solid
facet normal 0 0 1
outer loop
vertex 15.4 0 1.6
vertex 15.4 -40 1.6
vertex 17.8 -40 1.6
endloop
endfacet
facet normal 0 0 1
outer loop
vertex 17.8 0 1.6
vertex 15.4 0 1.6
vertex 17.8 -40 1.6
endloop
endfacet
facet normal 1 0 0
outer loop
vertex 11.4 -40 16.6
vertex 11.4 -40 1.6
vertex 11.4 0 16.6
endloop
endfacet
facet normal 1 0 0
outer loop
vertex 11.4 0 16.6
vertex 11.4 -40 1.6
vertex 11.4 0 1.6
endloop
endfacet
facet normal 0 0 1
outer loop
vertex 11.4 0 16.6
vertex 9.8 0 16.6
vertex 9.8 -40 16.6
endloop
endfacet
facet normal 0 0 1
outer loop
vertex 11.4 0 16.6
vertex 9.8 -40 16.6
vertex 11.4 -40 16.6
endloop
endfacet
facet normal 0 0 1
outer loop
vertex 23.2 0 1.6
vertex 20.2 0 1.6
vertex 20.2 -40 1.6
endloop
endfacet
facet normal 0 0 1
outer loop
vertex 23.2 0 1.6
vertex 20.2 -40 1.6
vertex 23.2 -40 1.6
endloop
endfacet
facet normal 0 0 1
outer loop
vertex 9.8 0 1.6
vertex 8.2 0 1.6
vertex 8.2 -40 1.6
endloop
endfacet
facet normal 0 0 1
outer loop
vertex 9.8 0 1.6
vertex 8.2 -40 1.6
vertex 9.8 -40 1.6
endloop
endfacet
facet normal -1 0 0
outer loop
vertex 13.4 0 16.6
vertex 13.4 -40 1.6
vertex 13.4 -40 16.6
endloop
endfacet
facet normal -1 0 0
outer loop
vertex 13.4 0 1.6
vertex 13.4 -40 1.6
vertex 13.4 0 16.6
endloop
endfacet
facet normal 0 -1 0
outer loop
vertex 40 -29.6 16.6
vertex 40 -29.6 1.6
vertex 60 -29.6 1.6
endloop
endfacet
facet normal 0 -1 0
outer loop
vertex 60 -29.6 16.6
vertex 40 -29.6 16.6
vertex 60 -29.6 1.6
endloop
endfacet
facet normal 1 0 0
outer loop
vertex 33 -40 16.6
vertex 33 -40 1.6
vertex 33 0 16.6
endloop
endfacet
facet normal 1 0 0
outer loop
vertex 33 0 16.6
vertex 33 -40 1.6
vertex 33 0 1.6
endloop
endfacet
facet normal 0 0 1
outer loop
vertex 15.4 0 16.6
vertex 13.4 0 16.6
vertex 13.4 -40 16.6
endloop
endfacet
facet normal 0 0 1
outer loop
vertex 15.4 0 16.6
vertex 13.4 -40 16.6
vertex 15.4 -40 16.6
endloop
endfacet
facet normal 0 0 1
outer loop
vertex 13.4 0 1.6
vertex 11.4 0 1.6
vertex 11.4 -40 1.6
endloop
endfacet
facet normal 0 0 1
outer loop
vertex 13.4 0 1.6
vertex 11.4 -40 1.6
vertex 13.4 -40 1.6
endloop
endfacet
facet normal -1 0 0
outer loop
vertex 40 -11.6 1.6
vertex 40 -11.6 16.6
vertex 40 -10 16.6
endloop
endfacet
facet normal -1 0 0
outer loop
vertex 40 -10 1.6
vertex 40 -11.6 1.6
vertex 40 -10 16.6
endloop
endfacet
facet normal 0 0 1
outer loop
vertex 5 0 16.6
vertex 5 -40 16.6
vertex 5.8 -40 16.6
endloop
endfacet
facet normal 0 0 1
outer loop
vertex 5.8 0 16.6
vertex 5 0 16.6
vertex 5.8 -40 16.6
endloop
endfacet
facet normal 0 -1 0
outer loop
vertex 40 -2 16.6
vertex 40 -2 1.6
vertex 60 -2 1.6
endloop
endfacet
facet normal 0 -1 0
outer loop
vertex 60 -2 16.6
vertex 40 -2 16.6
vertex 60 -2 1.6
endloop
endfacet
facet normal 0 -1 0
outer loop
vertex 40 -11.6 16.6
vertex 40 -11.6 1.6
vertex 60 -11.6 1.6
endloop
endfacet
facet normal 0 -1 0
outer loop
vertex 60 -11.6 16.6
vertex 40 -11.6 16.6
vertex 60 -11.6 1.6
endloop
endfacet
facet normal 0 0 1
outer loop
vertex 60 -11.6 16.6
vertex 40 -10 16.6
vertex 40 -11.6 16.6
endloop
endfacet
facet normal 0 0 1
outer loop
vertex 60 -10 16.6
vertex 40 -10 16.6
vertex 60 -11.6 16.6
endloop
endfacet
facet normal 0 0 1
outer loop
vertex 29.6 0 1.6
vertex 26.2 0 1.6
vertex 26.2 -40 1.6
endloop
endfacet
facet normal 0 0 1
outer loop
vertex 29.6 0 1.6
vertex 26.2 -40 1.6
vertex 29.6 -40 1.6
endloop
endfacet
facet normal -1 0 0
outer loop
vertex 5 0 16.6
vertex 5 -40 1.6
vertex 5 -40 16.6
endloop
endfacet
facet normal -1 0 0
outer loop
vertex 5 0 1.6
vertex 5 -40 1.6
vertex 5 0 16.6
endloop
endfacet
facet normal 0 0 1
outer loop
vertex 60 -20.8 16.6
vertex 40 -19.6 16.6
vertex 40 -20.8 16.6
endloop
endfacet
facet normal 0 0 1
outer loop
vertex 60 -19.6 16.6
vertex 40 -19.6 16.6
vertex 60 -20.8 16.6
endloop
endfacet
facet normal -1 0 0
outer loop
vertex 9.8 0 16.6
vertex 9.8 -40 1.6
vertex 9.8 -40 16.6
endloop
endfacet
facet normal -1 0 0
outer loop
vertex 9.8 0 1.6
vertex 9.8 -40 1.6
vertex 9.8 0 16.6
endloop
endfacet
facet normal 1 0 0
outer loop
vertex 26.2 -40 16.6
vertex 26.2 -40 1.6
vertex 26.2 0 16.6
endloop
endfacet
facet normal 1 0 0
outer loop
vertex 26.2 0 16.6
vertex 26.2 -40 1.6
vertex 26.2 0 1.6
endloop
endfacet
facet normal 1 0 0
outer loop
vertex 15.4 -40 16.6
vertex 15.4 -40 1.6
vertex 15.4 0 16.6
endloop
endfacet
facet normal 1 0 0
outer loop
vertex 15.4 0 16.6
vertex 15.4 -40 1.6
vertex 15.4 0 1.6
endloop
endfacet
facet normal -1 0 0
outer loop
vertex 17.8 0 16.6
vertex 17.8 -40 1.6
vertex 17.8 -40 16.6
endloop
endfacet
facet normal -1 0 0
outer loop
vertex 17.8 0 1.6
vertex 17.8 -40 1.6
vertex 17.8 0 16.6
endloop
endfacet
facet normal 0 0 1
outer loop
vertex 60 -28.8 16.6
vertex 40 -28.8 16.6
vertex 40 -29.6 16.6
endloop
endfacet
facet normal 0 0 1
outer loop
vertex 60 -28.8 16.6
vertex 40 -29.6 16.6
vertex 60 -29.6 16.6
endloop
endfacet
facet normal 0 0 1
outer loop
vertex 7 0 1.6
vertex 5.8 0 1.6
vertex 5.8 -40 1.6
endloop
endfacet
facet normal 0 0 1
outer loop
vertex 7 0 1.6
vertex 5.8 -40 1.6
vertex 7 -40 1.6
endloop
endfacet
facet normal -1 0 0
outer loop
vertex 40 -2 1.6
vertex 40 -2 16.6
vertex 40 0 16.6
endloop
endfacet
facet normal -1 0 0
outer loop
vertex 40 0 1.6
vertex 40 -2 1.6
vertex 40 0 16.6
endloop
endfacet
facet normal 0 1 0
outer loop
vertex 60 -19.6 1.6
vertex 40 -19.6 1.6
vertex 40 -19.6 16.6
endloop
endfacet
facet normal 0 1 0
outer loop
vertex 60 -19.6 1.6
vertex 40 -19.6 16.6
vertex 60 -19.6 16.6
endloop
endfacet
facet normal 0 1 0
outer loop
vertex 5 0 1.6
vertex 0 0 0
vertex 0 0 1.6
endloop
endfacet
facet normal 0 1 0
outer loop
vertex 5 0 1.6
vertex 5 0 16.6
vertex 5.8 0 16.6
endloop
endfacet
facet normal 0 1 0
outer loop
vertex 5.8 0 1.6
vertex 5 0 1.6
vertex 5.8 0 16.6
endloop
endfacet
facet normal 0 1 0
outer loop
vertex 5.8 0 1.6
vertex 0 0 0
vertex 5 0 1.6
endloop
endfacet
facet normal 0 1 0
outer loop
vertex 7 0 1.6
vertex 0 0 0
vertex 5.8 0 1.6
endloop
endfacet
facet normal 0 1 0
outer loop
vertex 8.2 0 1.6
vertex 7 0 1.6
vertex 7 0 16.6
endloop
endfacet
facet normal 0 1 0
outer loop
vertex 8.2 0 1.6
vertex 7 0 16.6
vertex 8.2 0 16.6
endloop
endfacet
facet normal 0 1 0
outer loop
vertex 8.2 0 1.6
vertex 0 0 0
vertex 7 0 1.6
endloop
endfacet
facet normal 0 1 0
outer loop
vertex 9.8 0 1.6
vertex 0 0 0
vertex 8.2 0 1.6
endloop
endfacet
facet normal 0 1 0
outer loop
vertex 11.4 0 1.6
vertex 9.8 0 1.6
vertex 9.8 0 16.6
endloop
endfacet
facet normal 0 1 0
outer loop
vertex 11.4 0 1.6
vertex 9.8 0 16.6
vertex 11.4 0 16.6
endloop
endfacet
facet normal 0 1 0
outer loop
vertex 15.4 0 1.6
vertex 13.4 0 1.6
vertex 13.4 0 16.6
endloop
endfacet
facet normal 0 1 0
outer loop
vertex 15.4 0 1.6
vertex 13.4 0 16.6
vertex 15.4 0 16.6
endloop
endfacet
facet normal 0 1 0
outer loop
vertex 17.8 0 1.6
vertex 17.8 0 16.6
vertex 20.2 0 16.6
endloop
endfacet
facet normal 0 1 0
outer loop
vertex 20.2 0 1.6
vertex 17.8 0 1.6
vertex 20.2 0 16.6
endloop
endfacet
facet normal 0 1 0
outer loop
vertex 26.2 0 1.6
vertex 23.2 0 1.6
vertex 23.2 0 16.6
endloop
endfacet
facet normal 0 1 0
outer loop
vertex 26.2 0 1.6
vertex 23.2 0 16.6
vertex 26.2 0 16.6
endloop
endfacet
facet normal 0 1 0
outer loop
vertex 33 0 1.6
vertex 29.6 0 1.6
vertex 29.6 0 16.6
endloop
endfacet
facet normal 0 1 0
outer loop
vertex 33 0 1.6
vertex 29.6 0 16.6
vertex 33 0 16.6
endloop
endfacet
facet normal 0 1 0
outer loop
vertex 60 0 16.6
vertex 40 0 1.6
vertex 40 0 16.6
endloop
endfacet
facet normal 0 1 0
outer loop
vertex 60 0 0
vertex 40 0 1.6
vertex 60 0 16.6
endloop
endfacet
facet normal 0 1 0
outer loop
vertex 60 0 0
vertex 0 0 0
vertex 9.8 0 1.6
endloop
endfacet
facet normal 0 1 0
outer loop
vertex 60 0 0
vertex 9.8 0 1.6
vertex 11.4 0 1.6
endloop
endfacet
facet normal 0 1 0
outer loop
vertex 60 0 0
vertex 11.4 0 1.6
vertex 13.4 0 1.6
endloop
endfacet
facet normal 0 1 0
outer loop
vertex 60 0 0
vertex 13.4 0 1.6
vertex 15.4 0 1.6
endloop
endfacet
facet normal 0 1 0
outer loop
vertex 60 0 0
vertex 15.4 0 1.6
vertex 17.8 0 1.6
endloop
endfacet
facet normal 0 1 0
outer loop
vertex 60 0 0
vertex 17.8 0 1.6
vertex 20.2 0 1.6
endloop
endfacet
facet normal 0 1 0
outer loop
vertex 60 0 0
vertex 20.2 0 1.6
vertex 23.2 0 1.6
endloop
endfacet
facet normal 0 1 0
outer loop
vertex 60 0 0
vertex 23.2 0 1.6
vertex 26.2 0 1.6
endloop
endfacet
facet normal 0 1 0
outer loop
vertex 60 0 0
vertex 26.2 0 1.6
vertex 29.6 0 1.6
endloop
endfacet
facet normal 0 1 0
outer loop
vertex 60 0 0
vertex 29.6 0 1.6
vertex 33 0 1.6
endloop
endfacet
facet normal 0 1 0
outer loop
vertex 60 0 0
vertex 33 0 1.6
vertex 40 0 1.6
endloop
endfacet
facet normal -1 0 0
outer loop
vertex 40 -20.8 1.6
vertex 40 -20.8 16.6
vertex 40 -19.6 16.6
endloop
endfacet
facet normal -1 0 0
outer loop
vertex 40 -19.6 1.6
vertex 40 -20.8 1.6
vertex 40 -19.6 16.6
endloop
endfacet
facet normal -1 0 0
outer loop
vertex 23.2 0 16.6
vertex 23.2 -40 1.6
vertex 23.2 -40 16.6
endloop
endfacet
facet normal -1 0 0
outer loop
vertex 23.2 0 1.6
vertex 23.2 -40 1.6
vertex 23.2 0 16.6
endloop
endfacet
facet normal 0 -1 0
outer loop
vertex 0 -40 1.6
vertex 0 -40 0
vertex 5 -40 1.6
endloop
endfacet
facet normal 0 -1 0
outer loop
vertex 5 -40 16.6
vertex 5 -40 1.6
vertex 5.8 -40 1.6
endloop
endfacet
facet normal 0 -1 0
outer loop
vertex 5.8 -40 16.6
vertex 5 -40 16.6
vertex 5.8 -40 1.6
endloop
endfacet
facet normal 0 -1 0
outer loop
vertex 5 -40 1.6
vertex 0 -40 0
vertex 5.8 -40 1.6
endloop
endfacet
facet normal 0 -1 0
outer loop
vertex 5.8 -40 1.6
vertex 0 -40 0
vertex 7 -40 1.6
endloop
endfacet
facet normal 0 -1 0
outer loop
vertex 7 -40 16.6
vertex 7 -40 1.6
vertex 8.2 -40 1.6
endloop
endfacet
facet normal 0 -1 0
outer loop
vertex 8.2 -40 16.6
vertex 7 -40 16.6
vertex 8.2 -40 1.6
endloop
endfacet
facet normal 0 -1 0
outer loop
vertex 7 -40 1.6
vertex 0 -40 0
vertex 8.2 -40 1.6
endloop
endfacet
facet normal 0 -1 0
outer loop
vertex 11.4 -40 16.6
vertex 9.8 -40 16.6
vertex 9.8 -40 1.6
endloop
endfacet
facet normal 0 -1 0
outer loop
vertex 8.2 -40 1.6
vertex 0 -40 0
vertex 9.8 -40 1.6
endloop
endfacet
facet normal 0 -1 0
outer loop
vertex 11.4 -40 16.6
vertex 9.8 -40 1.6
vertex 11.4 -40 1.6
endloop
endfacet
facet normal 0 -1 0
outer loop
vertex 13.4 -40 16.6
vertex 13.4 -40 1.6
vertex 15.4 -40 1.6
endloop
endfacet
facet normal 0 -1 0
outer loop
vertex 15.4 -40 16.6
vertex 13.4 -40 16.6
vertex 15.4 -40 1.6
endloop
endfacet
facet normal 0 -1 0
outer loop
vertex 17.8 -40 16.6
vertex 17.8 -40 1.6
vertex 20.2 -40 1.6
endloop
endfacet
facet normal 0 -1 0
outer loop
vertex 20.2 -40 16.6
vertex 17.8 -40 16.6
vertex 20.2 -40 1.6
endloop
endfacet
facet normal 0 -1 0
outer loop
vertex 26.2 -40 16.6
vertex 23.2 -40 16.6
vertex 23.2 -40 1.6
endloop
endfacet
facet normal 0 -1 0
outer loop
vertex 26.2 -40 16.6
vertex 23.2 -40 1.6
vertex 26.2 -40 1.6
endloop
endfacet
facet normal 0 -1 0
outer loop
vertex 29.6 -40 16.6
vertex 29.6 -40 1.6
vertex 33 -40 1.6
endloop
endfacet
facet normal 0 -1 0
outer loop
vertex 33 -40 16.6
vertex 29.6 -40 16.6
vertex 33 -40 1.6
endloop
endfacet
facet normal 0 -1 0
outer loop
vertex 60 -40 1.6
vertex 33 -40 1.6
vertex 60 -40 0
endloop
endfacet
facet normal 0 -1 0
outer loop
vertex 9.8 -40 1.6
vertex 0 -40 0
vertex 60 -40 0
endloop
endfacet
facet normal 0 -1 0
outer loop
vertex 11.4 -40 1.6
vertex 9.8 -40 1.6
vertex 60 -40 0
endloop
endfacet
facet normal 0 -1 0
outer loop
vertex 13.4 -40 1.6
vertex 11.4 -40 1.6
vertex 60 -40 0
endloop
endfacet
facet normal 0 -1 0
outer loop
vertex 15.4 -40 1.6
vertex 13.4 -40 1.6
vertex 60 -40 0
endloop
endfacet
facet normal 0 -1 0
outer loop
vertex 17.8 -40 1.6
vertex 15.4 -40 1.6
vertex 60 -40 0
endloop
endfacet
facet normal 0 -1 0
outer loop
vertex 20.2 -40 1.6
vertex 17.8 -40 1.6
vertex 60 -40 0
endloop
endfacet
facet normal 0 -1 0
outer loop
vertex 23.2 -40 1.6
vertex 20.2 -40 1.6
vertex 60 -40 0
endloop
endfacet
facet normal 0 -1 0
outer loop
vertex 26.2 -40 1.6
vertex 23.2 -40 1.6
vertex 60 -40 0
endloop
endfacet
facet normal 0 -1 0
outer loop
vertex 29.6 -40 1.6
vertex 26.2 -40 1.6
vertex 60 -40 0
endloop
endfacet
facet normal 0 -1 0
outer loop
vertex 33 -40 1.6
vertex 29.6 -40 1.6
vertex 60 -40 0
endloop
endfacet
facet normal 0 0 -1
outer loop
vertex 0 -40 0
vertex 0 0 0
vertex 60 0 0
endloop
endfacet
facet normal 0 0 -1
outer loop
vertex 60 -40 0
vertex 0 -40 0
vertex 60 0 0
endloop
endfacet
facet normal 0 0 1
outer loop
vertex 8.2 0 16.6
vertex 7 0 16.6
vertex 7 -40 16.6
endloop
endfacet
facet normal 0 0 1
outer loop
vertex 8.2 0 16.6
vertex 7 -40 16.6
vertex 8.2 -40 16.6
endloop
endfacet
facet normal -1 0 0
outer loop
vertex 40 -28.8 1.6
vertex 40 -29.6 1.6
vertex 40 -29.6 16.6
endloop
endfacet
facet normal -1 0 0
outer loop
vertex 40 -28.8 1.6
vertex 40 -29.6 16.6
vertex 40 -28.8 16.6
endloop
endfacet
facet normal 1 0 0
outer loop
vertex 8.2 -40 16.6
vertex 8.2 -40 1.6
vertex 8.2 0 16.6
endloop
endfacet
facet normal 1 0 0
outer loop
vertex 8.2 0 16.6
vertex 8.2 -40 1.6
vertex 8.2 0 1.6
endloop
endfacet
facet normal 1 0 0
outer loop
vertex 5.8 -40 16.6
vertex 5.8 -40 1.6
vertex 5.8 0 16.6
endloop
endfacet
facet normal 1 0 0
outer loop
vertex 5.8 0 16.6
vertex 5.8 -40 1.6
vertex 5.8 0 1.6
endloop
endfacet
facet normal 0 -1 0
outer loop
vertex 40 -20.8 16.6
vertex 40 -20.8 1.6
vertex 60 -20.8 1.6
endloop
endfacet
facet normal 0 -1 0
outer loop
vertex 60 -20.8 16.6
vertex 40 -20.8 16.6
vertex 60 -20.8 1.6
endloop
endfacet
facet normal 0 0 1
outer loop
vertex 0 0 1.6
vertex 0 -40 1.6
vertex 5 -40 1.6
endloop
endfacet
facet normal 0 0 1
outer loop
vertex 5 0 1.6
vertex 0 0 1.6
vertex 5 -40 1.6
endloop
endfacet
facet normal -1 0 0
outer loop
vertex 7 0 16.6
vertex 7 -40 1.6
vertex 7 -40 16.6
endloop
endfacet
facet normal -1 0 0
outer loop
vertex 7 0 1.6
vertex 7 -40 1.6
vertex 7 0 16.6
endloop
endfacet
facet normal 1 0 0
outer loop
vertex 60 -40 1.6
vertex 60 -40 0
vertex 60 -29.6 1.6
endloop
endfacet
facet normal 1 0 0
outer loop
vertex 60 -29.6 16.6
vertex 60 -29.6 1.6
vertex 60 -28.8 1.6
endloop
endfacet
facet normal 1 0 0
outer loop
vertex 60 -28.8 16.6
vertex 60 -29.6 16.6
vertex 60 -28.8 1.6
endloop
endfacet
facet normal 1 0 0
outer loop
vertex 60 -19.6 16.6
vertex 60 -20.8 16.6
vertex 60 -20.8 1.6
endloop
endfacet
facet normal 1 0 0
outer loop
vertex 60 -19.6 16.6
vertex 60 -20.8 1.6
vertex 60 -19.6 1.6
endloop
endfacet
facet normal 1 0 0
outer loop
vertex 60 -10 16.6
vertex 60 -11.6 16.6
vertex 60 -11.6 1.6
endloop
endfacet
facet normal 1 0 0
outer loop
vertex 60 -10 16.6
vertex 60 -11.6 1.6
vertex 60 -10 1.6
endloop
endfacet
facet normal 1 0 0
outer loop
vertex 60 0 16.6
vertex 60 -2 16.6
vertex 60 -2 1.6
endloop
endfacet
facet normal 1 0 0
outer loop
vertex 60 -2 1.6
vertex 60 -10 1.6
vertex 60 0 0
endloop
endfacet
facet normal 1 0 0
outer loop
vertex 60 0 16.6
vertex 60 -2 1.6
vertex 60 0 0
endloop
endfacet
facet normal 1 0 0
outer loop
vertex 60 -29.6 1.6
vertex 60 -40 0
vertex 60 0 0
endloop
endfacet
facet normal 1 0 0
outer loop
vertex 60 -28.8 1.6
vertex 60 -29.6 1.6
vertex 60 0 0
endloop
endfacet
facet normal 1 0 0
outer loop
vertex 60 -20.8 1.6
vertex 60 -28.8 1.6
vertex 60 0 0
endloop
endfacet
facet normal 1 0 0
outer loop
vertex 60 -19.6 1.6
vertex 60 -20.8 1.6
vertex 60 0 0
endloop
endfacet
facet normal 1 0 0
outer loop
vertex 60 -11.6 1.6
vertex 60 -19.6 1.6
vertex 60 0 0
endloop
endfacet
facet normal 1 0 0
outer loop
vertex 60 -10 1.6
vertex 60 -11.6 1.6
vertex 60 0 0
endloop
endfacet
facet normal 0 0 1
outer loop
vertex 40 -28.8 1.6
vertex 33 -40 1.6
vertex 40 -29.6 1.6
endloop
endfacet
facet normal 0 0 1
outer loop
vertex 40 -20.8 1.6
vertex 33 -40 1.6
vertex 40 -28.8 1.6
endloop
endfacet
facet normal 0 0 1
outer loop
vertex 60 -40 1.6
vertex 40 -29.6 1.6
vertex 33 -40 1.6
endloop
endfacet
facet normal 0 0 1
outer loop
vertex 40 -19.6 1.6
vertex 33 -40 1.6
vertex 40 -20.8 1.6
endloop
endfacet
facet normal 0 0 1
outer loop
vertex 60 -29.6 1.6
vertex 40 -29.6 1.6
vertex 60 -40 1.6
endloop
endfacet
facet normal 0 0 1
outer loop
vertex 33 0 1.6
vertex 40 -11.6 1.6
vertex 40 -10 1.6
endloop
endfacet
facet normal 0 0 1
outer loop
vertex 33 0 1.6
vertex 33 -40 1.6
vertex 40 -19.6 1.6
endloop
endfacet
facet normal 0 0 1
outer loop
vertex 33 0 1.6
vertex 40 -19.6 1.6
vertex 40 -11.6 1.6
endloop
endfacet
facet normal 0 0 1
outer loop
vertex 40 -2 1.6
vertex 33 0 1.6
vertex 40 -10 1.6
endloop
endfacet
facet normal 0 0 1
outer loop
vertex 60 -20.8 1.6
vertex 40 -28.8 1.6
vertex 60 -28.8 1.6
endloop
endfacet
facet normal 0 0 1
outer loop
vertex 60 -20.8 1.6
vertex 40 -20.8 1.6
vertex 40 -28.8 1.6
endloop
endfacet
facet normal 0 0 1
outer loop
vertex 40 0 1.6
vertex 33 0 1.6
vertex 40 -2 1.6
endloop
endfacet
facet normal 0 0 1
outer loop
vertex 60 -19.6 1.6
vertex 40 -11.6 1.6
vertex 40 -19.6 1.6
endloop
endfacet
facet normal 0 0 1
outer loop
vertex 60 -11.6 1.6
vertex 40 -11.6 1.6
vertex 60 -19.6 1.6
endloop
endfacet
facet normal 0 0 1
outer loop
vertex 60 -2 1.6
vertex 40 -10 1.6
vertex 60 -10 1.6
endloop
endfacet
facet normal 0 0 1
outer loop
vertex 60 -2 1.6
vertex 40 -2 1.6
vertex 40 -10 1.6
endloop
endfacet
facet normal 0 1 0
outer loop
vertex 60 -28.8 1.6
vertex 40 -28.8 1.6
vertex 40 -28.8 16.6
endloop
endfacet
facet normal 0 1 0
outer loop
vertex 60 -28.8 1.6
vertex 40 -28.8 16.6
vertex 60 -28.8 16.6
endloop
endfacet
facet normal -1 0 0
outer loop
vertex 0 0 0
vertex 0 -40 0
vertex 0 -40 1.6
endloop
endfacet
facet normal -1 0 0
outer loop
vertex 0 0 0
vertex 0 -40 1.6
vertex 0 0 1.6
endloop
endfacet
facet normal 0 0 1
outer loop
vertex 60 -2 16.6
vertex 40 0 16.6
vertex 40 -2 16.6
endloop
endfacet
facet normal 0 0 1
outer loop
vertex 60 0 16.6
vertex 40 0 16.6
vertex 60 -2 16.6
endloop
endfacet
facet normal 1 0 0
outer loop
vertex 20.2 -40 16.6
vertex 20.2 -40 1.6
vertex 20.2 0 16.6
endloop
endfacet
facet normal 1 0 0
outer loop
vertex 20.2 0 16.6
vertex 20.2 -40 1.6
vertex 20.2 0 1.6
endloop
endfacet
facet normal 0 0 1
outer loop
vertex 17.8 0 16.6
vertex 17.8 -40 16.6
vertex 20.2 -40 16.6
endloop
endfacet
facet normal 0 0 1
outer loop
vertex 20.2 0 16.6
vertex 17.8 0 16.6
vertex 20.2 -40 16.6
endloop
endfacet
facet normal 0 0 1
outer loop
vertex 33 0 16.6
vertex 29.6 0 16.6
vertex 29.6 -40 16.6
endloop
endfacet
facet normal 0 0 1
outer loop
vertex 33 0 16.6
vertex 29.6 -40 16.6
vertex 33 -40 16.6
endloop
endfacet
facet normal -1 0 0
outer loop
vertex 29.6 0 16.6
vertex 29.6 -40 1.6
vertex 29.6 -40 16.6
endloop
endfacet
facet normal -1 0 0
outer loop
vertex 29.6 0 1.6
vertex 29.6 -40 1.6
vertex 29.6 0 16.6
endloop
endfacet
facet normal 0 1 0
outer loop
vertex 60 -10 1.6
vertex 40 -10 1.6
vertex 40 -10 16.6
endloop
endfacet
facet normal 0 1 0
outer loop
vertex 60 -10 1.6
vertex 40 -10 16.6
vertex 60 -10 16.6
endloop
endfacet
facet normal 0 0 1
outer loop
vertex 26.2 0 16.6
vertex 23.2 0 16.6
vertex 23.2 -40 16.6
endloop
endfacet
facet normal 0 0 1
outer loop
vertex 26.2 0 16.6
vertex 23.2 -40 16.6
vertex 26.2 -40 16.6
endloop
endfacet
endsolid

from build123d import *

# Parameters (mm, degrees)
F0_W     = 60
F0_H     = 40
F1_DEPTH = 1.6
F2_W     = 0.8
F2_H     = 40
F2_W_2   = 1.2
F2_W_3   = 1.6
F2_W_4   = 2
F2_W_5   = 2.4
F2_W_6   = 3
F2_W_7   = 3.4
F2_W_8   = 20
F2_H_2   = 0.8
F2_H_3   = 1.2
F2_H_4   = 1.6
F2_H_5   = 2
F3_DEPTH = 15


with BuildPart() as f1:
    # F0 (on Top) → F1 (new body)
    with BuildSketch(Plane.XY):
        with Locations((30, -20)):
            Rectangle(F0_W, F0_H)
    extrude(amount=F1_DEPTH)

    # F2 (on face) → F3 (join)
    with BuildSketch(Plane.XY.offset(1.6)):
        with Locations((5.4, -20)):
            Rectangle(F2_W, F2_H)
        with Locations((7.6, -20)):
            Rectangle(F2_W_2, F2_H)
        with Locations((10.6, -20)):
            Rectangle(F2_W_3, F2_H)
        with Locations((14.4, -20)):
            Rectangle(F2_W_4, F2_H)
        with Locations((19, -20)):
            Rectangle(F2_W_5, F2_H)
        with Locations((24.7, -20)):
            Rectangle(F2_W_6, F2_H)
        with Locations((31.3, -20)):
            Rectangle(F2_W_7, F2_H)
        with Locations((50, -29.2)):
            Rectangle(F2_W_8, F2_H_2)
        with Locations((50, -20.2)):
            Rectangle(F2_W_8, F2_H_3)
        with Locations((50, -10.8)):
            Rectangle(F2_W_8, F2_H_4)
        with Locations((50, -1)):
            Rectangle(F2_W_8, F2_H_5)
    extrude(amount=F3_DEPTH)


solid = f1.part
